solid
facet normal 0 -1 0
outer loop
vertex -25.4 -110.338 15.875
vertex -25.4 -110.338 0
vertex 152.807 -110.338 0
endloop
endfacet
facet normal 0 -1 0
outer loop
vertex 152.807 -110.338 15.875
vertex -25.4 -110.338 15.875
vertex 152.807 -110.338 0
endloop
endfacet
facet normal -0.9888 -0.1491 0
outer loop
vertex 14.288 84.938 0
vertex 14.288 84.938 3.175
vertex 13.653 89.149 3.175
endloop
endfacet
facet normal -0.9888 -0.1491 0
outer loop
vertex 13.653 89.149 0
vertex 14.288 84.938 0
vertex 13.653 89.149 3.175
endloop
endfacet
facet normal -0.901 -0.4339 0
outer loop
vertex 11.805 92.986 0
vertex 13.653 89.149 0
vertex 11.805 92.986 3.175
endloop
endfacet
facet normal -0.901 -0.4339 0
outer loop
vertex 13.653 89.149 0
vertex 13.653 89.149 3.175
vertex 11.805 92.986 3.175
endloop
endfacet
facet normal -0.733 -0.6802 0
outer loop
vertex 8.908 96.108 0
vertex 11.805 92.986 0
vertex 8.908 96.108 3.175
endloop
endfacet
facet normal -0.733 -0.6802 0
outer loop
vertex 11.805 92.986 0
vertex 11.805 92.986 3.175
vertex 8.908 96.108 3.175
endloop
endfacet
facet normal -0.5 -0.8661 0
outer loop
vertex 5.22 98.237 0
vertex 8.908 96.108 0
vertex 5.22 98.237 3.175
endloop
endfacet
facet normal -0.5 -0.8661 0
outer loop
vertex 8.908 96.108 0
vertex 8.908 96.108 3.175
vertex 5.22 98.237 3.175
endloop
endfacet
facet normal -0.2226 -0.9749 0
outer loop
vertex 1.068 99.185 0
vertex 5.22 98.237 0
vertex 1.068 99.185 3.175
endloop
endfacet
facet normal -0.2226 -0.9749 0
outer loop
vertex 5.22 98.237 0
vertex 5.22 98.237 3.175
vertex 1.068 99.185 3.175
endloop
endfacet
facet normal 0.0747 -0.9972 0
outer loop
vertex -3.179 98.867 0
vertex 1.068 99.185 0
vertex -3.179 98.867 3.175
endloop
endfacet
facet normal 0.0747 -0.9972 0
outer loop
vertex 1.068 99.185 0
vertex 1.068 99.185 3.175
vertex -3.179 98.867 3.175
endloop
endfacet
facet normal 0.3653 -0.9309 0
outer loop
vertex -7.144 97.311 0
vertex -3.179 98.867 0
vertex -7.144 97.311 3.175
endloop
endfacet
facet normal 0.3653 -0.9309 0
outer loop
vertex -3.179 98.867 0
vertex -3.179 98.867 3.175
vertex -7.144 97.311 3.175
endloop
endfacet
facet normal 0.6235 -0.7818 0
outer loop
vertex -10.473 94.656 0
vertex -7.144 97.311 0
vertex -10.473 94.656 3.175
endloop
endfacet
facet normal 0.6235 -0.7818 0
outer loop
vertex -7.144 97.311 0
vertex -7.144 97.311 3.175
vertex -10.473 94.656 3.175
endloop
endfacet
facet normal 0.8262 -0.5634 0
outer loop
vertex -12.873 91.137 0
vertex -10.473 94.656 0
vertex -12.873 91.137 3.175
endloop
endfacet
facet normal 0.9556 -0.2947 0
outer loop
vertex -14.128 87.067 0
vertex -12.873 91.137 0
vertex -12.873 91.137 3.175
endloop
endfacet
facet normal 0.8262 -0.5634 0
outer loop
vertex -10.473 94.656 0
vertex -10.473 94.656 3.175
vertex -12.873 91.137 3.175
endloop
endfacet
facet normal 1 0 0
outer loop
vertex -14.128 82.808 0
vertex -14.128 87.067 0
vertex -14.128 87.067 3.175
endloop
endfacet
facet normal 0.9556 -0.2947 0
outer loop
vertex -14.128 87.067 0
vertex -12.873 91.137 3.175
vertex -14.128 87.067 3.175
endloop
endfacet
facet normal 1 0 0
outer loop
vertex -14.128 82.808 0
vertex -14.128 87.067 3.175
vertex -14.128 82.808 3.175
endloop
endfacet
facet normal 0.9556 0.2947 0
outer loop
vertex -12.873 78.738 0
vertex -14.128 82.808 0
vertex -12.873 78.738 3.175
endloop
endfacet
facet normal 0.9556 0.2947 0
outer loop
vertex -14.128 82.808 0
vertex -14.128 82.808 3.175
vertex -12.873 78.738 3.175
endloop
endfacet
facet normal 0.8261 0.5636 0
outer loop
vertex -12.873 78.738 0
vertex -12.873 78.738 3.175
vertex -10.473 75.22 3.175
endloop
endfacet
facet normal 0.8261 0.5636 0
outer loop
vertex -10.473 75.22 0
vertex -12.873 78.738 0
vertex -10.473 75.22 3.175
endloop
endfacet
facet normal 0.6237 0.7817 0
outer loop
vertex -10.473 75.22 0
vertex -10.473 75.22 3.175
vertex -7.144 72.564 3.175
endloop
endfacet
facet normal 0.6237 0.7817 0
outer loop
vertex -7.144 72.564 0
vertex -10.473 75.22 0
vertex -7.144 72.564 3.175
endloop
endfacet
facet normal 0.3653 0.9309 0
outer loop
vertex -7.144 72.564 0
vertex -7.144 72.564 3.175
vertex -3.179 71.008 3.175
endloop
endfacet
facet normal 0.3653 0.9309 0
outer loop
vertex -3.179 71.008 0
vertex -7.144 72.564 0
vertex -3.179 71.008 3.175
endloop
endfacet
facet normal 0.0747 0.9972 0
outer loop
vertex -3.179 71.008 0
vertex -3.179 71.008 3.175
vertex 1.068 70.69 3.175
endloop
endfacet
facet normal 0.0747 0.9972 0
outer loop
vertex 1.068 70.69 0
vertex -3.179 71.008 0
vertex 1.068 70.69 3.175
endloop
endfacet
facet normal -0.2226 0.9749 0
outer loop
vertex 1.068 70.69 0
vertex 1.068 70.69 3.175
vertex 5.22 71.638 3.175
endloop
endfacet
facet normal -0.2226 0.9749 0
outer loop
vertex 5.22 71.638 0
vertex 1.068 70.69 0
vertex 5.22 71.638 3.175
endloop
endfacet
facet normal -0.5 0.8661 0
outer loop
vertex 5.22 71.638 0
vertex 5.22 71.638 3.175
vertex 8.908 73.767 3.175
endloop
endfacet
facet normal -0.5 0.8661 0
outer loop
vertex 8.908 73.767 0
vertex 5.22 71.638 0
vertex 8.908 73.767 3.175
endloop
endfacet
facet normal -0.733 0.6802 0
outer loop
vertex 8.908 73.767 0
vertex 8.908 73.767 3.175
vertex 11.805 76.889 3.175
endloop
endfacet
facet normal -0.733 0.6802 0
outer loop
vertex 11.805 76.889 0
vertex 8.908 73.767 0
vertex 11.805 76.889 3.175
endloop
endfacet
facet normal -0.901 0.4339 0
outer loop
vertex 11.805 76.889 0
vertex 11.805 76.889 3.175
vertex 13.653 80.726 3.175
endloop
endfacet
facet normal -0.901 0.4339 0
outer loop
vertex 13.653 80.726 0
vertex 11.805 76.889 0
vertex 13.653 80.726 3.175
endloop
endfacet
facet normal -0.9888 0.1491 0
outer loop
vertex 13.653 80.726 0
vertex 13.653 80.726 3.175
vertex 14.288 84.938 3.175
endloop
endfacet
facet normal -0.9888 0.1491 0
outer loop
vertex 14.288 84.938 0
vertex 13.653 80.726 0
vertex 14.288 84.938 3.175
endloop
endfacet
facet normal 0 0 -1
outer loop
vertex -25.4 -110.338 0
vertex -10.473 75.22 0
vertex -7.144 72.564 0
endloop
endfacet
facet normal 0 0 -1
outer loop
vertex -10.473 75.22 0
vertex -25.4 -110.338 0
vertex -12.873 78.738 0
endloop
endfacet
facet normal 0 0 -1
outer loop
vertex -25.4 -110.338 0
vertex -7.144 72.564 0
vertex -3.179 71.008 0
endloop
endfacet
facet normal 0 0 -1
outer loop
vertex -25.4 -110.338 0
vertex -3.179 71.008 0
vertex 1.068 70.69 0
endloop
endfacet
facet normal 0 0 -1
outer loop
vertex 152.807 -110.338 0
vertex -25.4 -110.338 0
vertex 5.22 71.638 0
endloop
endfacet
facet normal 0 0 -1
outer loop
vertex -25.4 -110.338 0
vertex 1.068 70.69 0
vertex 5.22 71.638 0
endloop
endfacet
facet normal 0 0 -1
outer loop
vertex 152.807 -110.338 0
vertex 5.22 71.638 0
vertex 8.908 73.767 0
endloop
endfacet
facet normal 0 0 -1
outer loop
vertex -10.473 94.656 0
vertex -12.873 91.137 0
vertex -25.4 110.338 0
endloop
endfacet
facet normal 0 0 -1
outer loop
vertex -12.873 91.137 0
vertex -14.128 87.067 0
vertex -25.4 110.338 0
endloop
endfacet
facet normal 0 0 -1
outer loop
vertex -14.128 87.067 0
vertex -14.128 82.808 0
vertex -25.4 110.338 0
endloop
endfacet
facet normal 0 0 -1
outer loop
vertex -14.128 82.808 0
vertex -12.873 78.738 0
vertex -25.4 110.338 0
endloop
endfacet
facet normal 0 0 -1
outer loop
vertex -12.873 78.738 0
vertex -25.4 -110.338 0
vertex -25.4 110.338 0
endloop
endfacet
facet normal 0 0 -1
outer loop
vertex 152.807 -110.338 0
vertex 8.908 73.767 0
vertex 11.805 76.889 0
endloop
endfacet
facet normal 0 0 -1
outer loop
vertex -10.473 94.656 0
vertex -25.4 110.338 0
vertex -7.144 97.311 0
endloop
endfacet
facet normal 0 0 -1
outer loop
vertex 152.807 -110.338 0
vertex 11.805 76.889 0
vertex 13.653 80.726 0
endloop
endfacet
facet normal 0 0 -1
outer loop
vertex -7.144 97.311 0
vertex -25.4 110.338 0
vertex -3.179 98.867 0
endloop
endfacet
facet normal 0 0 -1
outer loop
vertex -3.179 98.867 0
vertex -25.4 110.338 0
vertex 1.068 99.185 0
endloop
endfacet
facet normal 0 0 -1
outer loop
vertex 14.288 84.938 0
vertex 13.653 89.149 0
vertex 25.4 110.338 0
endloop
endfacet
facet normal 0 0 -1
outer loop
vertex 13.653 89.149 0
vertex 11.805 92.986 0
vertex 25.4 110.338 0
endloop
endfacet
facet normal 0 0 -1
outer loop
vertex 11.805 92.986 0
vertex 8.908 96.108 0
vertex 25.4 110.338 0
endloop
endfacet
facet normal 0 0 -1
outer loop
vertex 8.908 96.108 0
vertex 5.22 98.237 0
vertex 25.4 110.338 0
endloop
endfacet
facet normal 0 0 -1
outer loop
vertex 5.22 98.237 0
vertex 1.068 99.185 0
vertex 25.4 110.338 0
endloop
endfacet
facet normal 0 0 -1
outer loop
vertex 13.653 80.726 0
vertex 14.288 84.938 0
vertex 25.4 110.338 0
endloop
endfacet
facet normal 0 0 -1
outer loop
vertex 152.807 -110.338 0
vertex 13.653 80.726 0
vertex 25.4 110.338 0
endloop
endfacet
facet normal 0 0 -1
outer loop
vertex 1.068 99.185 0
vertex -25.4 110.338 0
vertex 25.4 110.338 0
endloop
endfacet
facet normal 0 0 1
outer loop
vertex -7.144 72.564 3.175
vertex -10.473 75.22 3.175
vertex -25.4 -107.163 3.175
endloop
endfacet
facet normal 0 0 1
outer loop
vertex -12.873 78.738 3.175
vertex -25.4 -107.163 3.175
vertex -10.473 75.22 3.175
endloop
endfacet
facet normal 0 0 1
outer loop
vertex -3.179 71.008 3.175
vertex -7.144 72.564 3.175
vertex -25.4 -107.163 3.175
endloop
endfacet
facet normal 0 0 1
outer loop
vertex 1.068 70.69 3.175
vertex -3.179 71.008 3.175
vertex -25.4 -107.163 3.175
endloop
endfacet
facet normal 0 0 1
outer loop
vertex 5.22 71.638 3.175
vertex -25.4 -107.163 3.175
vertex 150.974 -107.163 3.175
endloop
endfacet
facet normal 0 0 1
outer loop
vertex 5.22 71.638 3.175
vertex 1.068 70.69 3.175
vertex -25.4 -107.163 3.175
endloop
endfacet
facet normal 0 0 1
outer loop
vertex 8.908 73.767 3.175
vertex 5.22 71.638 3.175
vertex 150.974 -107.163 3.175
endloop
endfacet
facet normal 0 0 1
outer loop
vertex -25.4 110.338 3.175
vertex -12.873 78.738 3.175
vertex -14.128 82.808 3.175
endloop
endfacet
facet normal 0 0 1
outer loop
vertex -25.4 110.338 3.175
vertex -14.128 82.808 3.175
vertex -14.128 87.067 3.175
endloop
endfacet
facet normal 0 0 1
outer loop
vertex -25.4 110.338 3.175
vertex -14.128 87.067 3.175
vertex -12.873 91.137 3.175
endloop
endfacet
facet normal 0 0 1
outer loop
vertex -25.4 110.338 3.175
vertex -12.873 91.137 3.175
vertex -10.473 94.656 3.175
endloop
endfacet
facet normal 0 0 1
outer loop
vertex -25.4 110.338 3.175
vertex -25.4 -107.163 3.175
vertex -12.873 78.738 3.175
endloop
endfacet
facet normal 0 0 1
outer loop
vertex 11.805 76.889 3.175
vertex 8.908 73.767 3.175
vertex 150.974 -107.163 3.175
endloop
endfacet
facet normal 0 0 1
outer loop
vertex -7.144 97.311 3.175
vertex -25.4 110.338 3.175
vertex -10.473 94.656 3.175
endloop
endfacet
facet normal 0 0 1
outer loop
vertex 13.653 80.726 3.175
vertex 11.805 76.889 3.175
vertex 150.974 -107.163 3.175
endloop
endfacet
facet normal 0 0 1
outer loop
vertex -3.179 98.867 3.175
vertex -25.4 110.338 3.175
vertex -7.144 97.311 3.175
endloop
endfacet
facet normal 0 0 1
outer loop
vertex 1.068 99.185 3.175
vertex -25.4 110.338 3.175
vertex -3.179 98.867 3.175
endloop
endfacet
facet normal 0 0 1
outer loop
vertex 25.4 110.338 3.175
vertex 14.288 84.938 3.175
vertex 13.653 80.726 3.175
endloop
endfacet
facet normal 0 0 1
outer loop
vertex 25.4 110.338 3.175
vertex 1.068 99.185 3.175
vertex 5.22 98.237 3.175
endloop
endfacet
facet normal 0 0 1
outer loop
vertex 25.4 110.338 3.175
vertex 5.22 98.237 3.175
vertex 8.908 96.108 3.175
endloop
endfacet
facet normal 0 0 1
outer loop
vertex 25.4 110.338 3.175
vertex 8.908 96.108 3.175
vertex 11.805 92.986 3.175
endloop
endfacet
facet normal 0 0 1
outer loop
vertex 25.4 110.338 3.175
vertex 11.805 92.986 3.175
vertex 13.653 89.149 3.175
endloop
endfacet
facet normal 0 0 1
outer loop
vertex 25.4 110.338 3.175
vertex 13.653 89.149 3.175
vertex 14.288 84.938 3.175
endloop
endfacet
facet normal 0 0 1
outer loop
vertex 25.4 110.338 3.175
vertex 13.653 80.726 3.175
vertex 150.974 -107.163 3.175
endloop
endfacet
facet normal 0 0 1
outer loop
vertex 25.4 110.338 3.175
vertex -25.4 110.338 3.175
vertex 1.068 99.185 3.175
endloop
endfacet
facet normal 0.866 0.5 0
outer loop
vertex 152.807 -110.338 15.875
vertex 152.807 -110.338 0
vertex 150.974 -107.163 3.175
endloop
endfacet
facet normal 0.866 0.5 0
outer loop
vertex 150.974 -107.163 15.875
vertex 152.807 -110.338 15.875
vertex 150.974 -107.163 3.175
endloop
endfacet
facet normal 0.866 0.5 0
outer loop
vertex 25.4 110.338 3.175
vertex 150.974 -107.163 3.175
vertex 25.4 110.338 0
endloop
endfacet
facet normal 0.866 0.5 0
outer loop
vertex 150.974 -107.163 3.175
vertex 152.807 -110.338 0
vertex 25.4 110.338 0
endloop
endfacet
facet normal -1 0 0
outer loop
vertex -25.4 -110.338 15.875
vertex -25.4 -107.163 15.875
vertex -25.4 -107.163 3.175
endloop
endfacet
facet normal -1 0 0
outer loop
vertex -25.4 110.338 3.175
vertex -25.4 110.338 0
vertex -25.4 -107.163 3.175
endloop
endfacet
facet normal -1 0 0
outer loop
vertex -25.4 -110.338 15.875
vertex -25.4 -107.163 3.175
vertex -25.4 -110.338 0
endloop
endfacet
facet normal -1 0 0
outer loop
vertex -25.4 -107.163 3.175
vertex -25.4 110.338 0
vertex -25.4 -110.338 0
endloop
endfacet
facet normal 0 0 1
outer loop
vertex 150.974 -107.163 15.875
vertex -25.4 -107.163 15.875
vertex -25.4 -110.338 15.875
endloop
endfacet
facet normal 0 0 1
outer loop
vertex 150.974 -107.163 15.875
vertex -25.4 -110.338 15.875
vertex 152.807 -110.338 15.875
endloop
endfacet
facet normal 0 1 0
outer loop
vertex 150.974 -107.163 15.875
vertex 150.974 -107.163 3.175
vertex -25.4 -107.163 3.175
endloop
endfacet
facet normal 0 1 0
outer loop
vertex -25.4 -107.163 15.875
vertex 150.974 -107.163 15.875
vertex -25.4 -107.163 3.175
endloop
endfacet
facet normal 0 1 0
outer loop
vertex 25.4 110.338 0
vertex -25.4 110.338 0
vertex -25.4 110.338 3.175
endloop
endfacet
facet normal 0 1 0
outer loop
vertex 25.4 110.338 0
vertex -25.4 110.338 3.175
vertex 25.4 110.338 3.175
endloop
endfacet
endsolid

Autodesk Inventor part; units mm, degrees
ref_plane "YZ Plane" through (0, 0, 0) normal (1, 0, 0) x (0, 1, 0)
ref_plane "XZ Plane" through (0, 0, 0) normal (0, 1, 0) x (-1, 0, 0)
ref_plane "XY Plane" through (0, 0, 0) normal (0, 0, 1) x (1, 0, 0)
sketch "Sketch1" plane through (0, 0, 0) normal (0, 0, 1) x (1, 0, 0)
  line L0 (25.4, -110.3376) -> (-25.4, -110.3376)
  line L1 (-25.4, -110.3376) -> (-25.4, 110.3376)
  line L2 (-25.4, 110.3376) -> (25.4, 110.3376)
  line L3 (25.4, 110.3376) -> (25.4, -110.3376)
  line L4 (25.4, -110.3376) -> (-25.4, 110.3376) construction
  line L5 (-25.4, -110.3376) -> (25.4, 110.3376) construction
  line L6 (25.4, 110.3376) -> (152.8069, -110.3376)
  line L7 (25.4, 110.3376) -> (280.2138, 110.3376) construction
  line L8 (152.8069, -110.3376) -> (25.4, -110.3376)
  point P0 (0, 0)
  dimension "d0" = 50.8
  dimension "d1" = 220.6752
  dimension "d2" = 60
extrude "Extrusion1" add sketch "Sketch1" along normal blind 3.175
sketch "Sketch2" plane through (0, 0, 3.175) normal (0, 0, 1) x (1, 0, 0)
  line L0 (152.8069, -110.3376) -> (25.4, 110.3376) projected
  line L1 (-25.4, -110.3376) -> (152.8069, -110.3376)
  line L2 (152.8069, -107.1626) -> (-25.4, -107.1626)
  line L3 (-25.4, -107.1626) -> (-25.4, -110.3376)
  line L4 (150.9738, -107.1626) -> (152.8069, -110.3376)
  point P0 (0, 0)
  dimension "d5" = 3.175
extrude "Extrusion2" add sketch "Sketch2" along normal blind 12.7
sketch "Sketch3" plane through (0, 0, 3.175) normal (0, 0, 1) x (1, 0, 0)
  line L0 (-25.4, 110.3376) -> (0, 110.3376)
  line L1 (0, 110.3376) -> (0, 84.9376)
  line L2 (0, 84.9376) -> (-25.4, 84.9376)
  line L3 (-25.4, 84.9376) -> (-25.4, 110.3376)
  circle A0 centre (0, 84.9376) radius 14.2875
  point P0 (0, 0)
  dimension "d8" = 25.4
  dimension "d9" = 25.4
  dimension "d10" = 28.575
extrude "Extrusion3" cut sketch "Sketch3" against normal blind 25.4 contours A0 L2 L1 | L1 L2 A0
properties part number "LPlate"
